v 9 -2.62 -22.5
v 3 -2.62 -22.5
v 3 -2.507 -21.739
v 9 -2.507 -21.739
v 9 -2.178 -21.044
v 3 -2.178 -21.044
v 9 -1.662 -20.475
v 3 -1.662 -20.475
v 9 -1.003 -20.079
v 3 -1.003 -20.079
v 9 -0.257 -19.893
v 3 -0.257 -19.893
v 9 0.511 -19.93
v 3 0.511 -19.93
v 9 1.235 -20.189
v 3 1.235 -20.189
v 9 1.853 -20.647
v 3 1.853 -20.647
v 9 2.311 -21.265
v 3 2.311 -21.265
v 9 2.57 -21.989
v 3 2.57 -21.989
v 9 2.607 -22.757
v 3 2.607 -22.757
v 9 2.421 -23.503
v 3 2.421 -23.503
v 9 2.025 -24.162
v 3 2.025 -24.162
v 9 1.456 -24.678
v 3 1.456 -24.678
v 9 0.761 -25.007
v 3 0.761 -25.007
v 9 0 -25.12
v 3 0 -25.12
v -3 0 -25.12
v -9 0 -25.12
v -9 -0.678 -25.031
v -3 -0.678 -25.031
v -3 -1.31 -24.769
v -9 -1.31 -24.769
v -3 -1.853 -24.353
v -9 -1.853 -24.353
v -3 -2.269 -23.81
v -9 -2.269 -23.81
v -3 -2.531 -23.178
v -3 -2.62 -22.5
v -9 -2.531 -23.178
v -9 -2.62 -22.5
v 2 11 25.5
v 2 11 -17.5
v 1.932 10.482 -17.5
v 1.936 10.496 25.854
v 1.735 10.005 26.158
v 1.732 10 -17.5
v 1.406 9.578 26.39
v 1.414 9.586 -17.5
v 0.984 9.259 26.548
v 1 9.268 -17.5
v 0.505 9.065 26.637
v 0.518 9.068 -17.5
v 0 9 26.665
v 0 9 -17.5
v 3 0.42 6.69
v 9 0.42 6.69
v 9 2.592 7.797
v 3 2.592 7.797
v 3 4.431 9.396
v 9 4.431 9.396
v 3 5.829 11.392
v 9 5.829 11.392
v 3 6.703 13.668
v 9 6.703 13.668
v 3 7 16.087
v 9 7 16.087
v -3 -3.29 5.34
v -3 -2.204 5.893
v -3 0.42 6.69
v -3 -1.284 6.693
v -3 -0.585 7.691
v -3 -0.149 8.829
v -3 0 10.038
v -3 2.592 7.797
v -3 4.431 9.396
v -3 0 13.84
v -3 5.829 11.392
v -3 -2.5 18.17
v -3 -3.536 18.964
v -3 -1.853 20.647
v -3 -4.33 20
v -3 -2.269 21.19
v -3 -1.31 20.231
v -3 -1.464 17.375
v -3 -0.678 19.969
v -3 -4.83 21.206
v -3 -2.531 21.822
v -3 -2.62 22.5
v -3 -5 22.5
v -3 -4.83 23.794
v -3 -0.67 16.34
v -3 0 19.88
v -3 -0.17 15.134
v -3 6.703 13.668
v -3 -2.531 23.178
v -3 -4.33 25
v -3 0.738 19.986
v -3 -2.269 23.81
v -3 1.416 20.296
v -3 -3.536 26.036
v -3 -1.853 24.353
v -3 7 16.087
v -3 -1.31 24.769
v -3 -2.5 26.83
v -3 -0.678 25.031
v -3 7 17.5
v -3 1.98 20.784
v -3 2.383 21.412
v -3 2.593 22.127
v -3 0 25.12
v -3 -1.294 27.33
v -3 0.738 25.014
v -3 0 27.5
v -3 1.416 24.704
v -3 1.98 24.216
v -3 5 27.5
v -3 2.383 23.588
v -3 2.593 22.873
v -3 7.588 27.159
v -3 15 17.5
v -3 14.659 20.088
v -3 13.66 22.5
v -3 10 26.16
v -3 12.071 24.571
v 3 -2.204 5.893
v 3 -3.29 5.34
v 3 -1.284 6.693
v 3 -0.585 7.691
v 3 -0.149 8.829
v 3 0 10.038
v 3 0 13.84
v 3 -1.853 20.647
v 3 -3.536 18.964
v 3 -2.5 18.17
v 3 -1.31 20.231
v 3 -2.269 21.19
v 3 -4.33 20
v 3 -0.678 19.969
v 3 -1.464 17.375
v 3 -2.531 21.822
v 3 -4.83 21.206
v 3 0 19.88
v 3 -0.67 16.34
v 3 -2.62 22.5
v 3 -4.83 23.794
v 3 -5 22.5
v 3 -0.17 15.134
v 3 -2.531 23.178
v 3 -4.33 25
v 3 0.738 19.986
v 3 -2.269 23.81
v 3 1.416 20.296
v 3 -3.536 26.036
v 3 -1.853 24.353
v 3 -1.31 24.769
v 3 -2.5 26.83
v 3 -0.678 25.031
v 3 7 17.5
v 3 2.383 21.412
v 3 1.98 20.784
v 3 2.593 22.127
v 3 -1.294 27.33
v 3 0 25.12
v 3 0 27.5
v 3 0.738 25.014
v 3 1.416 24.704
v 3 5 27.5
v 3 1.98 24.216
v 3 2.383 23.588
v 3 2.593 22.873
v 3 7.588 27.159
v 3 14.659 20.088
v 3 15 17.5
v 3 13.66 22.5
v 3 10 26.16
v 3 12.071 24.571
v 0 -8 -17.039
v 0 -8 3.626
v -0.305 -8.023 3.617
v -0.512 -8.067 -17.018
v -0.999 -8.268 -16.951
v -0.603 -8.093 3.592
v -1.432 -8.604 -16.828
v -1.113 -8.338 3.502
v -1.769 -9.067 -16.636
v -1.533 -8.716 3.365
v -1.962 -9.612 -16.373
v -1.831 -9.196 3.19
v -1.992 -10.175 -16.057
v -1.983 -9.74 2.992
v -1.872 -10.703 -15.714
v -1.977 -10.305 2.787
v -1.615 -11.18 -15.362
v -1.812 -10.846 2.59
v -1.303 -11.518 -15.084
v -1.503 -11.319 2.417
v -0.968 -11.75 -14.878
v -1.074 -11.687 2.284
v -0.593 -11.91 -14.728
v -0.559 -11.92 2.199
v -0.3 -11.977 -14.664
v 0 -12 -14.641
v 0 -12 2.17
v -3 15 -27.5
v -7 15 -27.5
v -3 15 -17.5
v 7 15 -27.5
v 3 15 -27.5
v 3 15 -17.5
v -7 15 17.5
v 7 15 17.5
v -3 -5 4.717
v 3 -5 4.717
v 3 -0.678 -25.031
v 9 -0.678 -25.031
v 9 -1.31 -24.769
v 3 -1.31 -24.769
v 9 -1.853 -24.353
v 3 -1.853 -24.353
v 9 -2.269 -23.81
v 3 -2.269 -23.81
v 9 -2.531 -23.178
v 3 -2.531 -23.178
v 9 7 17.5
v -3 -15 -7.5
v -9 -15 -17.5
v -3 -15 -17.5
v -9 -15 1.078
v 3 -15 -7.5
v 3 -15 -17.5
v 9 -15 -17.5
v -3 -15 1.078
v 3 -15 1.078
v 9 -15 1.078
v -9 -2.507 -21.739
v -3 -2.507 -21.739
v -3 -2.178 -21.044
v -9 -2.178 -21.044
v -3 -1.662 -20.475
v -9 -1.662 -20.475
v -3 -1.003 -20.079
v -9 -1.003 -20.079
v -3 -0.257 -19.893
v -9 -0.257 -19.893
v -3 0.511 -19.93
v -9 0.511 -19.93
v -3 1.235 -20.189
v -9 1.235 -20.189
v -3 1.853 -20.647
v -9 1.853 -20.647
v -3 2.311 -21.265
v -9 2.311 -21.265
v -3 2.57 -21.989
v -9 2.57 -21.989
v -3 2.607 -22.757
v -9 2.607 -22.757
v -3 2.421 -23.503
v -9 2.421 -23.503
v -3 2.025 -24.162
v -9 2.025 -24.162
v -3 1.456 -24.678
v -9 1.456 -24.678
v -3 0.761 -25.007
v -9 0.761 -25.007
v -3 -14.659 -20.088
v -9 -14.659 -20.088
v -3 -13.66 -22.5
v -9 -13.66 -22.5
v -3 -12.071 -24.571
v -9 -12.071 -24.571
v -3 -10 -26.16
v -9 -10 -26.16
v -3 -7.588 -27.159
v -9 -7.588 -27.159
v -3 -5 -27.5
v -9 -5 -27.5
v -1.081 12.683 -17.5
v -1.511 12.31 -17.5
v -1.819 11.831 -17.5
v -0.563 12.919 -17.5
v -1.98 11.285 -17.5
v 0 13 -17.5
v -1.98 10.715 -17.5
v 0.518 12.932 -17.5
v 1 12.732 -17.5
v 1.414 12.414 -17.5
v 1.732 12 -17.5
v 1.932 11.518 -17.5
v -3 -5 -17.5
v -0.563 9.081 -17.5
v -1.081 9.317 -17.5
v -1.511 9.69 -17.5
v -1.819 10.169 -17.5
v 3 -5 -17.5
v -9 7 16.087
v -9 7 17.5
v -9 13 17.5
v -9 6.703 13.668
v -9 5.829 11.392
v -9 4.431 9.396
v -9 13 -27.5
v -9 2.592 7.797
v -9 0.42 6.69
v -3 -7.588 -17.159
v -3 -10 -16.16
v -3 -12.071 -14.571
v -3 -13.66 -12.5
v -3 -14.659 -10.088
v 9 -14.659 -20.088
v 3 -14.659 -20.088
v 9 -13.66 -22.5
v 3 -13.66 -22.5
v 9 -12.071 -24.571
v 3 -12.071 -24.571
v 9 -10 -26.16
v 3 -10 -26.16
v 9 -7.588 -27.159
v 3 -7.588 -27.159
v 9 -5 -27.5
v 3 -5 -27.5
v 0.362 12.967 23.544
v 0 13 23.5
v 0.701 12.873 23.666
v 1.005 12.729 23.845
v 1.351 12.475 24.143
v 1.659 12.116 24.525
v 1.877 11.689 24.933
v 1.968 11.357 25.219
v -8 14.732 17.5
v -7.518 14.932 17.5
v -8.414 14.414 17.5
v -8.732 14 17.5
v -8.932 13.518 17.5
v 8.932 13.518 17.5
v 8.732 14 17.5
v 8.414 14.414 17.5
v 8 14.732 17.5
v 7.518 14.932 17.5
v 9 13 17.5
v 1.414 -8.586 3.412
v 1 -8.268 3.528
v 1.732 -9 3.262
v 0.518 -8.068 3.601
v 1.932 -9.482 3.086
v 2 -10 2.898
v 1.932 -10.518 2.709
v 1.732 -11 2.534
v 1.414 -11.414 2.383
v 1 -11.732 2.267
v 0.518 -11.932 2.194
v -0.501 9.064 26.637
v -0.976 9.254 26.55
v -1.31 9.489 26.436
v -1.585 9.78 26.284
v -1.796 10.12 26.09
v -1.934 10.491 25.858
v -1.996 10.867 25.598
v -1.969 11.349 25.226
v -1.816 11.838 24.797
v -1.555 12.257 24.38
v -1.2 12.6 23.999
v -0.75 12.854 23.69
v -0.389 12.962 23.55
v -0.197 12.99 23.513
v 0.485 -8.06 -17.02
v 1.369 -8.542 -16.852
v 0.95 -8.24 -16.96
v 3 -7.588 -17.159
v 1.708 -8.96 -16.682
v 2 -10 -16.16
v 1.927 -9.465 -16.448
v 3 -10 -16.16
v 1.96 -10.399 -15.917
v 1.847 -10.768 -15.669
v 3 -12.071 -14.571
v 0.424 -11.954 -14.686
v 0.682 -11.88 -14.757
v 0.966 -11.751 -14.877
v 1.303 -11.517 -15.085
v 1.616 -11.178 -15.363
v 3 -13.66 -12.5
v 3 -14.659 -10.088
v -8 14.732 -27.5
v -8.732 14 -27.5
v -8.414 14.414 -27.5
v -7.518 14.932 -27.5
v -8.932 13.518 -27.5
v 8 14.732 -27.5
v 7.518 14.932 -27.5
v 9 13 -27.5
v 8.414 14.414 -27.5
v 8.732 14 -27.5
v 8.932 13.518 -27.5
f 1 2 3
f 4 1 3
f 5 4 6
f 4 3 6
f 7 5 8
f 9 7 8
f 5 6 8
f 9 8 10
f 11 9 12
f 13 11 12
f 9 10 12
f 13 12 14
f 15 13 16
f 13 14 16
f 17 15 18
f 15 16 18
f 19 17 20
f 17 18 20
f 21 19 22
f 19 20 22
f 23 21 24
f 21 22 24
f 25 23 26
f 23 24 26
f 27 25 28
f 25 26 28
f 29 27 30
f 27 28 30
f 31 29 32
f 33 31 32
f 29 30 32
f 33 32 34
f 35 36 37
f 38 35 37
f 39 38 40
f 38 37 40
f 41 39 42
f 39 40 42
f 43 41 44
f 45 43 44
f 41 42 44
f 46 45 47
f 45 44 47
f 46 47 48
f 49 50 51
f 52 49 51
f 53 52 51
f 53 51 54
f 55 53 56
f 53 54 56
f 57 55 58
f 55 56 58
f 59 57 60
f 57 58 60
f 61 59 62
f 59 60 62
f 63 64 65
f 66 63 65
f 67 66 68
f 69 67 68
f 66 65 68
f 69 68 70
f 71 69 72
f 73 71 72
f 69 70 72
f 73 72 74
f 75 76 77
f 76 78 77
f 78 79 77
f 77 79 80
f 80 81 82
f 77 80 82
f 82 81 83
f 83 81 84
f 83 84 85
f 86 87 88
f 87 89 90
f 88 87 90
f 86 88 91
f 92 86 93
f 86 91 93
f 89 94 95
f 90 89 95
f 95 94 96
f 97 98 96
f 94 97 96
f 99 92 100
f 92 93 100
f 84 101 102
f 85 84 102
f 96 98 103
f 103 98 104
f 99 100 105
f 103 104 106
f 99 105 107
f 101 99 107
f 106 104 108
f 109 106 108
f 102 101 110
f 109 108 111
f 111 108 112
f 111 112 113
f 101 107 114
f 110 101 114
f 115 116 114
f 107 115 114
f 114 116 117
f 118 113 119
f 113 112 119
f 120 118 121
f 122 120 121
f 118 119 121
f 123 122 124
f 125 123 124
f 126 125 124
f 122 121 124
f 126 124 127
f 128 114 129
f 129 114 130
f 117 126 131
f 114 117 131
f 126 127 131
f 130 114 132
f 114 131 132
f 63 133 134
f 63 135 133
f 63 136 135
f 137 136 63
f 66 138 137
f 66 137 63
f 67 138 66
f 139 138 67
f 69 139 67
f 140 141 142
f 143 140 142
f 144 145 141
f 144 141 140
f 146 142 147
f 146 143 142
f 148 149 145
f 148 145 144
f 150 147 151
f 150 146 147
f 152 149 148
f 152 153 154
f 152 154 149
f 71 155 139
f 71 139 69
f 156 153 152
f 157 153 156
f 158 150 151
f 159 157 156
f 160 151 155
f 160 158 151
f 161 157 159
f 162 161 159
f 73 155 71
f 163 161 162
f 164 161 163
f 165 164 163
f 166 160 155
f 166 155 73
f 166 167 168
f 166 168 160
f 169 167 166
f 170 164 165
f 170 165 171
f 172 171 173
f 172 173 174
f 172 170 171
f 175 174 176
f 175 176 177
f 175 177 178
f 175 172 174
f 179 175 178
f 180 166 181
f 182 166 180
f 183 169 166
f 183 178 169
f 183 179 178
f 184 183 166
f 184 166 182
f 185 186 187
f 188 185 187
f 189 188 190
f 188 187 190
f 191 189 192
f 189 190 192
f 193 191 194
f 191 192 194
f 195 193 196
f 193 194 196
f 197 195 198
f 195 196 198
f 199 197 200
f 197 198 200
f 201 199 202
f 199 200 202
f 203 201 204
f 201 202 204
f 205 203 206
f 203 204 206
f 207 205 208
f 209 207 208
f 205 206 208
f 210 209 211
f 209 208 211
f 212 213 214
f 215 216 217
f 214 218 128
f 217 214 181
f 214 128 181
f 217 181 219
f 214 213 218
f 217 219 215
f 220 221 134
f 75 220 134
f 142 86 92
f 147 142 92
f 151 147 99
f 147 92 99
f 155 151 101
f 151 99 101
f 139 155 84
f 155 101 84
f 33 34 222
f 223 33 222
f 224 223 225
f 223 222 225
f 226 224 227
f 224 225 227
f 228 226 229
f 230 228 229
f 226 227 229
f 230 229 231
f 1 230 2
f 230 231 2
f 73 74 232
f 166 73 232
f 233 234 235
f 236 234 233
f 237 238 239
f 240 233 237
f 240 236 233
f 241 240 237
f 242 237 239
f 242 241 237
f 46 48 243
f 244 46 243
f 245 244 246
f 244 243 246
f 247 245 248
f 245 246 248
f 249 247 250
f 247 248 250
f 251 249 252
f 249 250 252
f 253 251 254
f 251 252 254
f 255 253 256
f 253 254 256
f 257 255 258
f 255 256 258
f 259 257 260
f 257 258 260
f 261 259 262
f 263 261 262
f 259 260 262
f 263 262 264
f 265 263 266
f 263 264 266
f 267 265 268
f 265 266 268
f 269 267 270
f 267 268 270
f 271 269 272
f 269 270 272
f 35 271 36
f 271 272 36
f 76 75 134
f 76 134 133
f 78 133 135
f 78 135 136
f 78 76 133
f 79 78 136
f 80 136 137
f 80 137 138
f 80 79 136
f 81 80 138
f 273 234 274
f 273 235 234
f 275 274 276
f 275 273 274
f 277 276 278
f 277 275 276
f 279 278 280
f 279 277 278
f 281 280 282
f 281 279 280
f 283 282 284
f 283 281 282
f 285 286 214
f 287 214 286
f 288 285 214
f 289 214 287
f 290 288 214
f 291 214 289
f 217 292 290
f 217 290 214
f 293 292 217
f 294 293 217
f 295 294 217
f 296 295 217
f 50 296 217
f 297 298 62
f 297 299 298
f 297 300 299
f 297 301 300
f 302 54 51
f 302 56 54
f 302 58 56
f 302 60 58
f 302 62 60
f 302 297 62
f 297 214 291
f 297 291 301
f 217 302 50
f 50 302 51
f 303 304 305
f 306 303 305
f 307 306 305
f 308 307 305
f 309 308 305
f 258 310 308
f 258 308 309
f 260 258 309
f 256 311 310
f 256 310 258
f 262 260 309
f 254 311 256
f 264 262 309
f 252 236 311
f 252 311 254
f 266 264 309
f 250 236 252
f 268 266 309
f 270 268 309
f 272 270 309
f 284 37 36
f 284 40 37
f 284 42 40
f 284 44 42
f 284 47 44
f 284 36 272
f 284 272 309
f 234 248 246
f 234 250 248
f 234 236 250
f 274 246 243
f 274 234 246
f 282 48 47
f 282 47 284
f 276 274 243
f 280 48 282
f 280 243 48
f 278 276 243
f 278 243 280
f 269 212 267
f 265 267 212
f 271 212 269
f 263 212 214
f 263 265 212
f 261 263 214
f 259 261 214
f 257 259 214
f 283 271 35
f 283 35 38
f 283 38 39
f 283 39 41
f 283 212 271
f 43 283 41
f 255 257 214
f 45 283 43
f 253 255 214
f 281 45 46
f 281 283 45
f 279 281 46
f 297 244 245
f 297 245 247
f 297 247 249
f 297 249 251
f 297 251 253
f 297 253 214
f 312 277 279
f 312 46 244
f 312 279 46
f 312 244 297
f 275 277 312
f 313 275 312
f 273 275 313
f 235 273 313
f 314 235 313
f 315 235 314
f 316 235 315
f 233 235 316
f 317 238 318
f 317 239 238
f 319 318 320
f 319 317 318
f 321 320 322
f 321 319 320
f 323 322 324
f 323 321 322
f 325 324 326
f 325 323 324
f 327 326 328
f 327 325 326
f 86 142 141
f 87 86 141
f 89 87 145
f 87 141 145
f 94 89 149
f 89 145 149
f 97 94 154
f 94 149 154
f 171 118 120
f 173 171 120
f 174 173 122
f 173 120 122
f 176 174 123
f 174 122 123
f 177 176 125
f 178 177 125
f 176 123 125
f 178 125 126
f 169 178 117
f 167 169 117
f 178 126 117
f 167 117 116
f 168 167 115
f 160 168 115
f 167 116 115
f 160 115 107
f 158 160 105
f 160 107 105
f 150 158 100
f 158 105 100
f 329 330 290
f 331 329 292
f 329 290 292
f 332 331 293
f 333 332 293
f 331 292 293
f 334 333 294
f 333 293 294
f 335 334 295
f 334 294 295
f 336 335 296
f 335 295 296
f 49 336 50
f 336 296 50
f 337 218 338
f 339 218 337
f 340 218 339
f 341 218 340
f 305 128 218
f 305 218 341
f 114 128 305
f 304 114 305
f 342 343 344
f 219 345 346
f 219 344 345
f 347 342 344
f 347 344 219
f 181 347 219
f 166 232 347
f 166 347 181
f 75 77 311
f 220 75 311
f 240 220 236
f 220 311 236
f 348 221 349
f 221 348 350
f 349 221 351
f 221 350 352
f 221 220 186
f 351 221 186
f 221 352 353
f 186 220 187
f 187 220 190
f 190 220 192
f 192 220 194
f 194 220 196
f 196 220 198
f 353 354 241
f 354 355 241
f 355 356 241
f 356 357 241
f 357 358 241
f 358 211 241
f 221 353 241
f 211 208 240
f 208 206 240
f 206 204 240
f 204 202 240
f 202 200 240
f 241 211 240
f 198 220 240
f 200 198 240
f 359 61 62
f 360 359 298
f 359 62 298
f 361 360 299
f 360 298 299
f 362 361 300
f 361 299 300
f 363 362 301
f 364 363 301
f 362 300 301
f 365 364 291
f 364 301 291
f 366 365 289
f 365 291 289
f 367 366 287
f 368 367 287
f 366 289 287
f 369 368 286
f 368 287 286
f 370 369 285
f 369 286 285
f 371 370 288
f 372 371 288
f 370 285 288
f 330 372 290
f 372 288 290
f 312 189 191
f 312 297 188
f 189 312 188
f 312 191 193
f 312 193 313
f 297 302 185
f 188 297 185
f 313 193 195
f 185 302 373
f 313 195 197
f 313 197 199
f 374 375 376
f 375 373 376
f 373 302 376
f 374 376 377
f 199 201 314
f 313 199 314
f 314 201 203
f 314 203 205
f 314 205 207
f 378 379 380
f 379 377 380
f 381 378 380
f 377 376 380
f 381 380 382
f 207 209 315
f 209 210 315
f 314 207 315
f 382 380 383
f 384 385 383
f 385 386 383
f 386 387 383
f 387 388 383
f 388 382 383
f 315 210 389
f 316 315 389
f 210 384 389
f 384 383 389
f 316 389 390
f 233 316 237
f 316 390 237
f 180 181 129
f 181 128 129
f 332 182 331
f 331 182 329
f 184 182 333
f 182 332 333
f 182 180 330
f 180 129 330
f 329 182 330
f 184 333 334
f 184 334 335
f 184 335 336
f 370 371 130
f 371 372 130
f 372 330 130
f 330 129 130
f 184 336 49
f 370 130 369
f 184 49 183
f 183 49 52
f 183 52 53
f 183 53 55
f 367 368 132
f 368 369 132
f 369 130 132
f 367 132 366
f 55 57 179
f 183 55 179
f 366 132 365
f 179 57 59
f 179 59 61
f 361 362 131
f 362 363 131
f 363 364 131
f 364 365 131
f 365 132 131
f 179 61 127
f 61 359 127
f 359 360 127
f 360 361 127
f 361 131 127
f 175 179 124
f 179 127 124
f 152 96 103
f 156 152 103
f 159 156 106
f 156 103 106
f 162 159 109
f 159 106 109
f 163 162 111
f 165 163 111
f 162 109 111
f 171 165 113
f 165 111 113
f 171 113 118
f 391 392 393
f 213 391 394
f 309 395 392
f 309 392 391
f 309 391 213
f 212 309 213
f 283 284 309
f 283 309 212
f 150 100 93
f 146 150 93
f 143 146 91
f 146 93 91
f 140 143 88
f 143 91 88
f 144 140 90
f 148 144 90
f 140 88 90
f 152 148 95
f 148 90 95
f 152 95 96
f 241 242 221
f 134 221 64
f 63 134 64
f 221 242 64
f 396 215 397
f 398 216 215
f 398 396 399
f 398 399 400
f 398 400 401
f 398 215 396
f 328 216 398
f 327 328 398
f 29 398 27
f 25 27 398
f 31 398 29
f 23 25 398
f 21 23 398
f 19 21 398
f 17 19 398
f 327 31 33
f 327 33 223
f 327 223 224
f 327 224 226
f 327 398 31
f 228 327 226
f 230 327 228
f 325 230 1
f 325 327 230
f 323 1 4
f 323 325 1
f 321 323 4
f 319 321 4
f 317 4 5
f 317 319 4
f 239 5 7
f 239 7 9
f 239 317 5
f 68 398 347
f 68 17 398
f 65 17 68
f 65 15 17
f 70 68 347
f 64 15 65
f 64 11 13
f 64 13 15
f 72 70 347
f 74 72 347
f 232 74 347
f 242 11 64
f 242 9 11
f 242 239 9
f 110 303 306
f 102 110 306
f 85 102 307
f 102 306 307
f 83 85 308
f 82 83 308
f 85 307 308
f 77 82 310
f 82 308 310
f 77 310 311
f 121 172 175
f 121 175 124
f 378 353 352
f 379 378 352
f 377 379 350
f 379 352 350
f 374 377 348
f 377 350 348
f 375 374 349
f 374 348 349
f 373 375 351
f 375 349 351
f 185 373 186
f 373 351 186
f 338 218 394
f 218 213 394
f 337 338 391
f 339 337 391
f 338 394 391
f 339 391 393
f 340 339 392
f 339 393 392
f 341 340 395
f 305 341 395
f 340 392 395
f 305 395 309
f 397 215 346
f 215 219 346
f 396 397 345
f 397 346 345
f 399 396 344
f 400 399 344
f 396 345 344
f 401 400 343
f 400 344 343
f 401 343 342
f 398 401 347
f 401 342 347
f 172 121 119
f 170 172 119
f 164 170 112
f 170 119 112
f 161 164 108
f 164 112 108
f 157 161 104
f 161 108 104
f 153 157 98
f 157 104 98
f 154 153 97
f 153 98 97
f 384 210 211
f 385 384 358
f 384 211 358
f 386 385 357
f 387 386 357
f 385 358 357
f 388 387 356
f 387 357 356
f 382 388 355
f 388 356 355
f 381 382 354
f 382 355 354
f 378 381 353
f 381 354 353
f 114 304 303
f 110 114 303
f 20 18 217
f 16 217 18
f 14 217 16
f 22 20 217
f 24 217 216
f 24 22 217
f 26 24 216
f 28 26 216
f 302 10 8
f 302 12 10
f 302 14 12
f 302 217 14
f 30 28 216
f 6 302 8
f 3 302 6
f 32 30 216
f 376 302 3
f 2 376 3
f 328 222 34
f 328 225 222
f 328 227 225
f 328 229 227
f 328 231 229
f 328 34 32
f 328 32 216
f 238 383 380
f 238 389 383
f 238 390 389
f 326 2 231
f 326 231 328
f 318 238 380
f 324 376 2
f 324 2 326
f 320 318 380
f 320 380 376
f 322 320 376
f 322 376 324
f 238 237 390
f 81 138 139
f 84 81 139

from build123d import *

# Parameters (mm, degrees)
F1_DEPTH     = 15
F3_DEPTH     = 6
F5_DEPTH     = 18
F6_R         = 10
F9_DEPTH     = 6
F10_DEPTH    = 6
F11_R        = 2
F13_DEPTH    = 6
F15_R        = 10
F19_DEPTH    = 50.001
F21_DEPTH    = 45.001
F23_DEPTH    = 6
F24_T1_DEPTH = 6


# Not quite as in the source:
# - a fillet or chamfer that OpenCascade refuses, or shapes differently, is made with other operations: its cross-section is extruded or revolved along the edge and cut away or added


with BuildPart() as f1:
    # F0 (on Front) → F1 (new body, symmetric)
    with BuildSketch(Plane.XZ):
        Polygon((9, -17.5), (9, 17.5), (3, 17.5), (3, 27.5), (-3, 27.5), (-3, 17.5), (-9, 17.5), (-9, -17.5), (-9, -27.5), (-3, -27.5), (-3, -17.5), (3, -17.5), (3, -27.5), (9, -27.5), align=None)
    extrude(amount=F1_DEPTH, both=True)

    # F2 (on face) → F3 (cut)
    with BuildSketch(Plane(origin=(-3, 0, 0), x_dir=(0, -1, 0), z_dir=(-1, 0, 0))):
        with BuildLine():
            ThreePointArc((0, 25.12), (-2.62, 22.5), (0, 19.88))
            Line((0, 19.88), (0, 25.12))
        make_face()
        with BuildLine():
            Line((0, 25.12), (0, 19.88))
            ThreePointArc((0, 19.88), (1.8526197667, 20.6473802333), (2.62, 22.5))
            ThreePointArc((2.62, 22.5), (1.8526197667, 24.3526197667), (0, 25.12))
        make_face()
    extrude(amount=-F3_DEPTH, mode=Mode.SUBTRACT)

    # F4 (on face) → F5 (cut)
    with BuildSketch(Plane(origin=(-9, 0, 0), x_dir=(0, -1, 0), z_dir=(-1, 0, 0))):
        with BuildLine():
            ThreePointArc((0, -25.12), (1.8526197667, -24.3526197667), (2.62, -22.5))
            ThreePointArc((2.62, -22.5), (-1.8526197667, -20.6473802333), (0, -25.12))
        make_face()
    extrude(amount=-F5_DEPTH, mode=Mode.SUBTRACT)

    # F6
    f6_edges = [f1.edges().sort_by_distance(p)[0] for p in [
        (0, 15, 27.5),
        (0, -15, 27.5),
        (6, -15, -27.5),
        (-6, -15, -27.5),
    ]]
    fillet(f6_edges, radius=F6_R)

    # F8 (on face) → F9 (cut)
    with BuildSketch(Plane(origin=(-9, 0, 0), x_dir=(0, -1, 0), z_dir=(-1, 0, 0))):
        with BuildLine():
            ThreePointArc((-7, 16.0872004348), (-5.1915204429, 10.3514360713), (-0.4202014333, 6.690274227))
            Line((-0.4202014333, 6.690274227), (15, 1.0777798989))
            Line((15, 1.0777798989), (15, 17.5))
            Line((15, 17.5), (-7, 17.5))
            Line((-7, 17.5), (-7, 16.0872004348))
        make_face()
    extrude(amount=-F9_DEPTH, mode=Mode.SUBTRACT)

    # F7 (on face) → F10 (cut)
    with BuildSketch(Plane.YZ.offset(9)):
        with BuildLine():
            Line((7, 17.5), (-15, 17.5))
            Line((-15, 17.5), (-15, 1.07778))
            Line((-15, 1.07778), (0.4202014333, 6.6902743281))
            ThreePointArc((0.4202014333, 6.6902743281), (5.1915204429, 10.3514361724), (7, 16.087200536))
            Line((7, 16.087200536), (7, 17.5))
        make_face()
    extrude(amount=-F10_DEPTH, mode=Mode.SUBTRACT)

    # F11
    f11_edges = [f1.edges().sort_by_distance(p)[0] for p in [
        (9, 15, -5),
        (-9, 15, -5),
    ]]
    fillet(f11_edges, radius=F11_R)

    # F12 (on face) → F13 (cut)
    with BuildSketch(Plane(origin=(-3, 0, 0), x_dir=(0, -1, 0), z_dir=(-1, 0, 0))):
        with BuildLine():
            Line((5, 27.5), (0, 27.5))
            ThreePointArc((0, 27.5), (3.5355339059, 26.0355339059), (5, 22.5))
            Line((5, 22.5), (5, 4.7174822415))
            Line((5, 4.7174822415), (15, 1.0777798989))
            Line((15, 1.0777798989), (15, 17.5))
            ThreePointArc((15, 17.5), (12.0710678119, 24.5710678119), (5, 27.5))
        make_face()
    extrude(amount=-F13_DEPTH, mode=Mode.SUBTRACT)

    # F15
    f15_edges = [f1.edges().sort_by_distance(p)[0] for p in [
        (0, -15, -17.5),
    ]]
    fillet(f15_edges, radius=F15_R)

    # F18 (on face) → F19 (cut, through all)
    with BuildSketch(Plane.XY.offset(22.5)):
        with BuildLine():
            ThreePointArc((2, -10), (1.4142135624, -8.5857864376), (0, -8))
            Line((0, -8), (0, -12))
            ThreePointArc((0, -12), (1.4142135624, -11.4142135624), (2, -10))
        make_face()
        with BuildLine():
            Line((0, -12), (0, -8))
            ThreePointArc((0, -8), (-2, -10), (0, -12))
        make_face()
    extrude(amount=-F19_DEPTH, mode=Mode.SUBTRACT)

    # F20 (on face) → F21 (cut, through all)
    with BuildSketch(Plane(origin=(0, 0, -17.5), x_dir=(1, 0, 0), z_dir=(0, 0, -1))):
        with BuildLine():
            ThreePointArc((0, -9), (-2, -11), (0, -13))
            Line((0, -13), (0, -11))
            Line((0, -11), (0, -9))
        make_face()
        with BuildLine():
            Line((0, -11), (0, -13))
            ThreePointArc((0, -13), (1.4142135624, -12.4142135624), (2, -11))
            ThreePointArc((2, -11), (1.4142135624, -9.5857864376), (0, -9))
            Line((0, -9), (0, -11))
        make_face()
    extrude(amount=-F21_DEPTH, mode=Mode.SUBTRACT)

    # F22 (on face) → F23 (cut)
    with BuildSketch(Plane.YZ.offset(3)):
        with BuildLine():
            ThreePointArc((0, 17.5), (-3.5355339059, 18.9644660941), (-5, 22.5))
            Line((-5, 22.5), (-5, 4.7174822415))
            Line((-5, 4.7174822415), (0, 6.5373334129))
            Line((0, 6.5373334129), (0, 17.5))
        make_face()
    extrude(amount=-F23_DEPTH, mode=Mode.SUBTRACT)

    # F24: fillet of radius 5 on 2 edges, made by hand

    # F24_s2 → F24_t1 (join)
    with BuildSketch(Plane.YZ.offset(-3)):
        with BuildLine():
            ThreePointArc((-2.5, 18.1698729811), (-0.6698729811, 16.3397459622), (0, 13.8397459622))
            Line((0, 13.8397459622), (0, 17.5))
            ThreePointArc((0, 17.5), (-1.2940952255, 17.6703708686), (-2.5, 18.1698729811))
        make_face()
        with BuildLine():
            ThreePointArc((-3.2898992834, 5.3399081011), (-0.9042397786, 7.1704890233), (0, 10.038371205))
            Line((0, 10.038371205), (0, 6.5373334129))
            Line((0, 6.5373334129), (-3.2898992834, 5.3399081011))
        make_face()
    extrude(amount=F24_T1_DEPTH)


solid = f1.part
